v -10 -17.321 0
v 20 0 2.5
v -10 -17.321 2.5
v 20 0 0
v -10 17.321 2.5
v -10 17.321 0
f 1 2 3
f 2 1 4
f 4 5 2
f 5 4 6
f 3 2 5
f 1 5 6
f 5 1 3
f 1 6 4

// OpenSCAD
side = 10;

module tetrahedron(side) {
  faces = [
    [1, 2, 3],
    [0, 1, 2],
    [1, 0, 3],
    [2, 3, 0]
  ];
  points = [
    [0, 0, side * sin(60)],
    [-side / 2, side * sin(30) / 2, 0],
    [side / 2, side * sin(30) / 2, 0],
    [0, -side * sin(60) + side * sin(30) / 2, 0]
  ];
  polyhedron(points, faces);
}

module inset_tetrahedron(side, inset) {
  tetrahedron(side);
  cylinder(inset, r=20, $fn=3);
}

inset_tetrahedron(25,2.5);
